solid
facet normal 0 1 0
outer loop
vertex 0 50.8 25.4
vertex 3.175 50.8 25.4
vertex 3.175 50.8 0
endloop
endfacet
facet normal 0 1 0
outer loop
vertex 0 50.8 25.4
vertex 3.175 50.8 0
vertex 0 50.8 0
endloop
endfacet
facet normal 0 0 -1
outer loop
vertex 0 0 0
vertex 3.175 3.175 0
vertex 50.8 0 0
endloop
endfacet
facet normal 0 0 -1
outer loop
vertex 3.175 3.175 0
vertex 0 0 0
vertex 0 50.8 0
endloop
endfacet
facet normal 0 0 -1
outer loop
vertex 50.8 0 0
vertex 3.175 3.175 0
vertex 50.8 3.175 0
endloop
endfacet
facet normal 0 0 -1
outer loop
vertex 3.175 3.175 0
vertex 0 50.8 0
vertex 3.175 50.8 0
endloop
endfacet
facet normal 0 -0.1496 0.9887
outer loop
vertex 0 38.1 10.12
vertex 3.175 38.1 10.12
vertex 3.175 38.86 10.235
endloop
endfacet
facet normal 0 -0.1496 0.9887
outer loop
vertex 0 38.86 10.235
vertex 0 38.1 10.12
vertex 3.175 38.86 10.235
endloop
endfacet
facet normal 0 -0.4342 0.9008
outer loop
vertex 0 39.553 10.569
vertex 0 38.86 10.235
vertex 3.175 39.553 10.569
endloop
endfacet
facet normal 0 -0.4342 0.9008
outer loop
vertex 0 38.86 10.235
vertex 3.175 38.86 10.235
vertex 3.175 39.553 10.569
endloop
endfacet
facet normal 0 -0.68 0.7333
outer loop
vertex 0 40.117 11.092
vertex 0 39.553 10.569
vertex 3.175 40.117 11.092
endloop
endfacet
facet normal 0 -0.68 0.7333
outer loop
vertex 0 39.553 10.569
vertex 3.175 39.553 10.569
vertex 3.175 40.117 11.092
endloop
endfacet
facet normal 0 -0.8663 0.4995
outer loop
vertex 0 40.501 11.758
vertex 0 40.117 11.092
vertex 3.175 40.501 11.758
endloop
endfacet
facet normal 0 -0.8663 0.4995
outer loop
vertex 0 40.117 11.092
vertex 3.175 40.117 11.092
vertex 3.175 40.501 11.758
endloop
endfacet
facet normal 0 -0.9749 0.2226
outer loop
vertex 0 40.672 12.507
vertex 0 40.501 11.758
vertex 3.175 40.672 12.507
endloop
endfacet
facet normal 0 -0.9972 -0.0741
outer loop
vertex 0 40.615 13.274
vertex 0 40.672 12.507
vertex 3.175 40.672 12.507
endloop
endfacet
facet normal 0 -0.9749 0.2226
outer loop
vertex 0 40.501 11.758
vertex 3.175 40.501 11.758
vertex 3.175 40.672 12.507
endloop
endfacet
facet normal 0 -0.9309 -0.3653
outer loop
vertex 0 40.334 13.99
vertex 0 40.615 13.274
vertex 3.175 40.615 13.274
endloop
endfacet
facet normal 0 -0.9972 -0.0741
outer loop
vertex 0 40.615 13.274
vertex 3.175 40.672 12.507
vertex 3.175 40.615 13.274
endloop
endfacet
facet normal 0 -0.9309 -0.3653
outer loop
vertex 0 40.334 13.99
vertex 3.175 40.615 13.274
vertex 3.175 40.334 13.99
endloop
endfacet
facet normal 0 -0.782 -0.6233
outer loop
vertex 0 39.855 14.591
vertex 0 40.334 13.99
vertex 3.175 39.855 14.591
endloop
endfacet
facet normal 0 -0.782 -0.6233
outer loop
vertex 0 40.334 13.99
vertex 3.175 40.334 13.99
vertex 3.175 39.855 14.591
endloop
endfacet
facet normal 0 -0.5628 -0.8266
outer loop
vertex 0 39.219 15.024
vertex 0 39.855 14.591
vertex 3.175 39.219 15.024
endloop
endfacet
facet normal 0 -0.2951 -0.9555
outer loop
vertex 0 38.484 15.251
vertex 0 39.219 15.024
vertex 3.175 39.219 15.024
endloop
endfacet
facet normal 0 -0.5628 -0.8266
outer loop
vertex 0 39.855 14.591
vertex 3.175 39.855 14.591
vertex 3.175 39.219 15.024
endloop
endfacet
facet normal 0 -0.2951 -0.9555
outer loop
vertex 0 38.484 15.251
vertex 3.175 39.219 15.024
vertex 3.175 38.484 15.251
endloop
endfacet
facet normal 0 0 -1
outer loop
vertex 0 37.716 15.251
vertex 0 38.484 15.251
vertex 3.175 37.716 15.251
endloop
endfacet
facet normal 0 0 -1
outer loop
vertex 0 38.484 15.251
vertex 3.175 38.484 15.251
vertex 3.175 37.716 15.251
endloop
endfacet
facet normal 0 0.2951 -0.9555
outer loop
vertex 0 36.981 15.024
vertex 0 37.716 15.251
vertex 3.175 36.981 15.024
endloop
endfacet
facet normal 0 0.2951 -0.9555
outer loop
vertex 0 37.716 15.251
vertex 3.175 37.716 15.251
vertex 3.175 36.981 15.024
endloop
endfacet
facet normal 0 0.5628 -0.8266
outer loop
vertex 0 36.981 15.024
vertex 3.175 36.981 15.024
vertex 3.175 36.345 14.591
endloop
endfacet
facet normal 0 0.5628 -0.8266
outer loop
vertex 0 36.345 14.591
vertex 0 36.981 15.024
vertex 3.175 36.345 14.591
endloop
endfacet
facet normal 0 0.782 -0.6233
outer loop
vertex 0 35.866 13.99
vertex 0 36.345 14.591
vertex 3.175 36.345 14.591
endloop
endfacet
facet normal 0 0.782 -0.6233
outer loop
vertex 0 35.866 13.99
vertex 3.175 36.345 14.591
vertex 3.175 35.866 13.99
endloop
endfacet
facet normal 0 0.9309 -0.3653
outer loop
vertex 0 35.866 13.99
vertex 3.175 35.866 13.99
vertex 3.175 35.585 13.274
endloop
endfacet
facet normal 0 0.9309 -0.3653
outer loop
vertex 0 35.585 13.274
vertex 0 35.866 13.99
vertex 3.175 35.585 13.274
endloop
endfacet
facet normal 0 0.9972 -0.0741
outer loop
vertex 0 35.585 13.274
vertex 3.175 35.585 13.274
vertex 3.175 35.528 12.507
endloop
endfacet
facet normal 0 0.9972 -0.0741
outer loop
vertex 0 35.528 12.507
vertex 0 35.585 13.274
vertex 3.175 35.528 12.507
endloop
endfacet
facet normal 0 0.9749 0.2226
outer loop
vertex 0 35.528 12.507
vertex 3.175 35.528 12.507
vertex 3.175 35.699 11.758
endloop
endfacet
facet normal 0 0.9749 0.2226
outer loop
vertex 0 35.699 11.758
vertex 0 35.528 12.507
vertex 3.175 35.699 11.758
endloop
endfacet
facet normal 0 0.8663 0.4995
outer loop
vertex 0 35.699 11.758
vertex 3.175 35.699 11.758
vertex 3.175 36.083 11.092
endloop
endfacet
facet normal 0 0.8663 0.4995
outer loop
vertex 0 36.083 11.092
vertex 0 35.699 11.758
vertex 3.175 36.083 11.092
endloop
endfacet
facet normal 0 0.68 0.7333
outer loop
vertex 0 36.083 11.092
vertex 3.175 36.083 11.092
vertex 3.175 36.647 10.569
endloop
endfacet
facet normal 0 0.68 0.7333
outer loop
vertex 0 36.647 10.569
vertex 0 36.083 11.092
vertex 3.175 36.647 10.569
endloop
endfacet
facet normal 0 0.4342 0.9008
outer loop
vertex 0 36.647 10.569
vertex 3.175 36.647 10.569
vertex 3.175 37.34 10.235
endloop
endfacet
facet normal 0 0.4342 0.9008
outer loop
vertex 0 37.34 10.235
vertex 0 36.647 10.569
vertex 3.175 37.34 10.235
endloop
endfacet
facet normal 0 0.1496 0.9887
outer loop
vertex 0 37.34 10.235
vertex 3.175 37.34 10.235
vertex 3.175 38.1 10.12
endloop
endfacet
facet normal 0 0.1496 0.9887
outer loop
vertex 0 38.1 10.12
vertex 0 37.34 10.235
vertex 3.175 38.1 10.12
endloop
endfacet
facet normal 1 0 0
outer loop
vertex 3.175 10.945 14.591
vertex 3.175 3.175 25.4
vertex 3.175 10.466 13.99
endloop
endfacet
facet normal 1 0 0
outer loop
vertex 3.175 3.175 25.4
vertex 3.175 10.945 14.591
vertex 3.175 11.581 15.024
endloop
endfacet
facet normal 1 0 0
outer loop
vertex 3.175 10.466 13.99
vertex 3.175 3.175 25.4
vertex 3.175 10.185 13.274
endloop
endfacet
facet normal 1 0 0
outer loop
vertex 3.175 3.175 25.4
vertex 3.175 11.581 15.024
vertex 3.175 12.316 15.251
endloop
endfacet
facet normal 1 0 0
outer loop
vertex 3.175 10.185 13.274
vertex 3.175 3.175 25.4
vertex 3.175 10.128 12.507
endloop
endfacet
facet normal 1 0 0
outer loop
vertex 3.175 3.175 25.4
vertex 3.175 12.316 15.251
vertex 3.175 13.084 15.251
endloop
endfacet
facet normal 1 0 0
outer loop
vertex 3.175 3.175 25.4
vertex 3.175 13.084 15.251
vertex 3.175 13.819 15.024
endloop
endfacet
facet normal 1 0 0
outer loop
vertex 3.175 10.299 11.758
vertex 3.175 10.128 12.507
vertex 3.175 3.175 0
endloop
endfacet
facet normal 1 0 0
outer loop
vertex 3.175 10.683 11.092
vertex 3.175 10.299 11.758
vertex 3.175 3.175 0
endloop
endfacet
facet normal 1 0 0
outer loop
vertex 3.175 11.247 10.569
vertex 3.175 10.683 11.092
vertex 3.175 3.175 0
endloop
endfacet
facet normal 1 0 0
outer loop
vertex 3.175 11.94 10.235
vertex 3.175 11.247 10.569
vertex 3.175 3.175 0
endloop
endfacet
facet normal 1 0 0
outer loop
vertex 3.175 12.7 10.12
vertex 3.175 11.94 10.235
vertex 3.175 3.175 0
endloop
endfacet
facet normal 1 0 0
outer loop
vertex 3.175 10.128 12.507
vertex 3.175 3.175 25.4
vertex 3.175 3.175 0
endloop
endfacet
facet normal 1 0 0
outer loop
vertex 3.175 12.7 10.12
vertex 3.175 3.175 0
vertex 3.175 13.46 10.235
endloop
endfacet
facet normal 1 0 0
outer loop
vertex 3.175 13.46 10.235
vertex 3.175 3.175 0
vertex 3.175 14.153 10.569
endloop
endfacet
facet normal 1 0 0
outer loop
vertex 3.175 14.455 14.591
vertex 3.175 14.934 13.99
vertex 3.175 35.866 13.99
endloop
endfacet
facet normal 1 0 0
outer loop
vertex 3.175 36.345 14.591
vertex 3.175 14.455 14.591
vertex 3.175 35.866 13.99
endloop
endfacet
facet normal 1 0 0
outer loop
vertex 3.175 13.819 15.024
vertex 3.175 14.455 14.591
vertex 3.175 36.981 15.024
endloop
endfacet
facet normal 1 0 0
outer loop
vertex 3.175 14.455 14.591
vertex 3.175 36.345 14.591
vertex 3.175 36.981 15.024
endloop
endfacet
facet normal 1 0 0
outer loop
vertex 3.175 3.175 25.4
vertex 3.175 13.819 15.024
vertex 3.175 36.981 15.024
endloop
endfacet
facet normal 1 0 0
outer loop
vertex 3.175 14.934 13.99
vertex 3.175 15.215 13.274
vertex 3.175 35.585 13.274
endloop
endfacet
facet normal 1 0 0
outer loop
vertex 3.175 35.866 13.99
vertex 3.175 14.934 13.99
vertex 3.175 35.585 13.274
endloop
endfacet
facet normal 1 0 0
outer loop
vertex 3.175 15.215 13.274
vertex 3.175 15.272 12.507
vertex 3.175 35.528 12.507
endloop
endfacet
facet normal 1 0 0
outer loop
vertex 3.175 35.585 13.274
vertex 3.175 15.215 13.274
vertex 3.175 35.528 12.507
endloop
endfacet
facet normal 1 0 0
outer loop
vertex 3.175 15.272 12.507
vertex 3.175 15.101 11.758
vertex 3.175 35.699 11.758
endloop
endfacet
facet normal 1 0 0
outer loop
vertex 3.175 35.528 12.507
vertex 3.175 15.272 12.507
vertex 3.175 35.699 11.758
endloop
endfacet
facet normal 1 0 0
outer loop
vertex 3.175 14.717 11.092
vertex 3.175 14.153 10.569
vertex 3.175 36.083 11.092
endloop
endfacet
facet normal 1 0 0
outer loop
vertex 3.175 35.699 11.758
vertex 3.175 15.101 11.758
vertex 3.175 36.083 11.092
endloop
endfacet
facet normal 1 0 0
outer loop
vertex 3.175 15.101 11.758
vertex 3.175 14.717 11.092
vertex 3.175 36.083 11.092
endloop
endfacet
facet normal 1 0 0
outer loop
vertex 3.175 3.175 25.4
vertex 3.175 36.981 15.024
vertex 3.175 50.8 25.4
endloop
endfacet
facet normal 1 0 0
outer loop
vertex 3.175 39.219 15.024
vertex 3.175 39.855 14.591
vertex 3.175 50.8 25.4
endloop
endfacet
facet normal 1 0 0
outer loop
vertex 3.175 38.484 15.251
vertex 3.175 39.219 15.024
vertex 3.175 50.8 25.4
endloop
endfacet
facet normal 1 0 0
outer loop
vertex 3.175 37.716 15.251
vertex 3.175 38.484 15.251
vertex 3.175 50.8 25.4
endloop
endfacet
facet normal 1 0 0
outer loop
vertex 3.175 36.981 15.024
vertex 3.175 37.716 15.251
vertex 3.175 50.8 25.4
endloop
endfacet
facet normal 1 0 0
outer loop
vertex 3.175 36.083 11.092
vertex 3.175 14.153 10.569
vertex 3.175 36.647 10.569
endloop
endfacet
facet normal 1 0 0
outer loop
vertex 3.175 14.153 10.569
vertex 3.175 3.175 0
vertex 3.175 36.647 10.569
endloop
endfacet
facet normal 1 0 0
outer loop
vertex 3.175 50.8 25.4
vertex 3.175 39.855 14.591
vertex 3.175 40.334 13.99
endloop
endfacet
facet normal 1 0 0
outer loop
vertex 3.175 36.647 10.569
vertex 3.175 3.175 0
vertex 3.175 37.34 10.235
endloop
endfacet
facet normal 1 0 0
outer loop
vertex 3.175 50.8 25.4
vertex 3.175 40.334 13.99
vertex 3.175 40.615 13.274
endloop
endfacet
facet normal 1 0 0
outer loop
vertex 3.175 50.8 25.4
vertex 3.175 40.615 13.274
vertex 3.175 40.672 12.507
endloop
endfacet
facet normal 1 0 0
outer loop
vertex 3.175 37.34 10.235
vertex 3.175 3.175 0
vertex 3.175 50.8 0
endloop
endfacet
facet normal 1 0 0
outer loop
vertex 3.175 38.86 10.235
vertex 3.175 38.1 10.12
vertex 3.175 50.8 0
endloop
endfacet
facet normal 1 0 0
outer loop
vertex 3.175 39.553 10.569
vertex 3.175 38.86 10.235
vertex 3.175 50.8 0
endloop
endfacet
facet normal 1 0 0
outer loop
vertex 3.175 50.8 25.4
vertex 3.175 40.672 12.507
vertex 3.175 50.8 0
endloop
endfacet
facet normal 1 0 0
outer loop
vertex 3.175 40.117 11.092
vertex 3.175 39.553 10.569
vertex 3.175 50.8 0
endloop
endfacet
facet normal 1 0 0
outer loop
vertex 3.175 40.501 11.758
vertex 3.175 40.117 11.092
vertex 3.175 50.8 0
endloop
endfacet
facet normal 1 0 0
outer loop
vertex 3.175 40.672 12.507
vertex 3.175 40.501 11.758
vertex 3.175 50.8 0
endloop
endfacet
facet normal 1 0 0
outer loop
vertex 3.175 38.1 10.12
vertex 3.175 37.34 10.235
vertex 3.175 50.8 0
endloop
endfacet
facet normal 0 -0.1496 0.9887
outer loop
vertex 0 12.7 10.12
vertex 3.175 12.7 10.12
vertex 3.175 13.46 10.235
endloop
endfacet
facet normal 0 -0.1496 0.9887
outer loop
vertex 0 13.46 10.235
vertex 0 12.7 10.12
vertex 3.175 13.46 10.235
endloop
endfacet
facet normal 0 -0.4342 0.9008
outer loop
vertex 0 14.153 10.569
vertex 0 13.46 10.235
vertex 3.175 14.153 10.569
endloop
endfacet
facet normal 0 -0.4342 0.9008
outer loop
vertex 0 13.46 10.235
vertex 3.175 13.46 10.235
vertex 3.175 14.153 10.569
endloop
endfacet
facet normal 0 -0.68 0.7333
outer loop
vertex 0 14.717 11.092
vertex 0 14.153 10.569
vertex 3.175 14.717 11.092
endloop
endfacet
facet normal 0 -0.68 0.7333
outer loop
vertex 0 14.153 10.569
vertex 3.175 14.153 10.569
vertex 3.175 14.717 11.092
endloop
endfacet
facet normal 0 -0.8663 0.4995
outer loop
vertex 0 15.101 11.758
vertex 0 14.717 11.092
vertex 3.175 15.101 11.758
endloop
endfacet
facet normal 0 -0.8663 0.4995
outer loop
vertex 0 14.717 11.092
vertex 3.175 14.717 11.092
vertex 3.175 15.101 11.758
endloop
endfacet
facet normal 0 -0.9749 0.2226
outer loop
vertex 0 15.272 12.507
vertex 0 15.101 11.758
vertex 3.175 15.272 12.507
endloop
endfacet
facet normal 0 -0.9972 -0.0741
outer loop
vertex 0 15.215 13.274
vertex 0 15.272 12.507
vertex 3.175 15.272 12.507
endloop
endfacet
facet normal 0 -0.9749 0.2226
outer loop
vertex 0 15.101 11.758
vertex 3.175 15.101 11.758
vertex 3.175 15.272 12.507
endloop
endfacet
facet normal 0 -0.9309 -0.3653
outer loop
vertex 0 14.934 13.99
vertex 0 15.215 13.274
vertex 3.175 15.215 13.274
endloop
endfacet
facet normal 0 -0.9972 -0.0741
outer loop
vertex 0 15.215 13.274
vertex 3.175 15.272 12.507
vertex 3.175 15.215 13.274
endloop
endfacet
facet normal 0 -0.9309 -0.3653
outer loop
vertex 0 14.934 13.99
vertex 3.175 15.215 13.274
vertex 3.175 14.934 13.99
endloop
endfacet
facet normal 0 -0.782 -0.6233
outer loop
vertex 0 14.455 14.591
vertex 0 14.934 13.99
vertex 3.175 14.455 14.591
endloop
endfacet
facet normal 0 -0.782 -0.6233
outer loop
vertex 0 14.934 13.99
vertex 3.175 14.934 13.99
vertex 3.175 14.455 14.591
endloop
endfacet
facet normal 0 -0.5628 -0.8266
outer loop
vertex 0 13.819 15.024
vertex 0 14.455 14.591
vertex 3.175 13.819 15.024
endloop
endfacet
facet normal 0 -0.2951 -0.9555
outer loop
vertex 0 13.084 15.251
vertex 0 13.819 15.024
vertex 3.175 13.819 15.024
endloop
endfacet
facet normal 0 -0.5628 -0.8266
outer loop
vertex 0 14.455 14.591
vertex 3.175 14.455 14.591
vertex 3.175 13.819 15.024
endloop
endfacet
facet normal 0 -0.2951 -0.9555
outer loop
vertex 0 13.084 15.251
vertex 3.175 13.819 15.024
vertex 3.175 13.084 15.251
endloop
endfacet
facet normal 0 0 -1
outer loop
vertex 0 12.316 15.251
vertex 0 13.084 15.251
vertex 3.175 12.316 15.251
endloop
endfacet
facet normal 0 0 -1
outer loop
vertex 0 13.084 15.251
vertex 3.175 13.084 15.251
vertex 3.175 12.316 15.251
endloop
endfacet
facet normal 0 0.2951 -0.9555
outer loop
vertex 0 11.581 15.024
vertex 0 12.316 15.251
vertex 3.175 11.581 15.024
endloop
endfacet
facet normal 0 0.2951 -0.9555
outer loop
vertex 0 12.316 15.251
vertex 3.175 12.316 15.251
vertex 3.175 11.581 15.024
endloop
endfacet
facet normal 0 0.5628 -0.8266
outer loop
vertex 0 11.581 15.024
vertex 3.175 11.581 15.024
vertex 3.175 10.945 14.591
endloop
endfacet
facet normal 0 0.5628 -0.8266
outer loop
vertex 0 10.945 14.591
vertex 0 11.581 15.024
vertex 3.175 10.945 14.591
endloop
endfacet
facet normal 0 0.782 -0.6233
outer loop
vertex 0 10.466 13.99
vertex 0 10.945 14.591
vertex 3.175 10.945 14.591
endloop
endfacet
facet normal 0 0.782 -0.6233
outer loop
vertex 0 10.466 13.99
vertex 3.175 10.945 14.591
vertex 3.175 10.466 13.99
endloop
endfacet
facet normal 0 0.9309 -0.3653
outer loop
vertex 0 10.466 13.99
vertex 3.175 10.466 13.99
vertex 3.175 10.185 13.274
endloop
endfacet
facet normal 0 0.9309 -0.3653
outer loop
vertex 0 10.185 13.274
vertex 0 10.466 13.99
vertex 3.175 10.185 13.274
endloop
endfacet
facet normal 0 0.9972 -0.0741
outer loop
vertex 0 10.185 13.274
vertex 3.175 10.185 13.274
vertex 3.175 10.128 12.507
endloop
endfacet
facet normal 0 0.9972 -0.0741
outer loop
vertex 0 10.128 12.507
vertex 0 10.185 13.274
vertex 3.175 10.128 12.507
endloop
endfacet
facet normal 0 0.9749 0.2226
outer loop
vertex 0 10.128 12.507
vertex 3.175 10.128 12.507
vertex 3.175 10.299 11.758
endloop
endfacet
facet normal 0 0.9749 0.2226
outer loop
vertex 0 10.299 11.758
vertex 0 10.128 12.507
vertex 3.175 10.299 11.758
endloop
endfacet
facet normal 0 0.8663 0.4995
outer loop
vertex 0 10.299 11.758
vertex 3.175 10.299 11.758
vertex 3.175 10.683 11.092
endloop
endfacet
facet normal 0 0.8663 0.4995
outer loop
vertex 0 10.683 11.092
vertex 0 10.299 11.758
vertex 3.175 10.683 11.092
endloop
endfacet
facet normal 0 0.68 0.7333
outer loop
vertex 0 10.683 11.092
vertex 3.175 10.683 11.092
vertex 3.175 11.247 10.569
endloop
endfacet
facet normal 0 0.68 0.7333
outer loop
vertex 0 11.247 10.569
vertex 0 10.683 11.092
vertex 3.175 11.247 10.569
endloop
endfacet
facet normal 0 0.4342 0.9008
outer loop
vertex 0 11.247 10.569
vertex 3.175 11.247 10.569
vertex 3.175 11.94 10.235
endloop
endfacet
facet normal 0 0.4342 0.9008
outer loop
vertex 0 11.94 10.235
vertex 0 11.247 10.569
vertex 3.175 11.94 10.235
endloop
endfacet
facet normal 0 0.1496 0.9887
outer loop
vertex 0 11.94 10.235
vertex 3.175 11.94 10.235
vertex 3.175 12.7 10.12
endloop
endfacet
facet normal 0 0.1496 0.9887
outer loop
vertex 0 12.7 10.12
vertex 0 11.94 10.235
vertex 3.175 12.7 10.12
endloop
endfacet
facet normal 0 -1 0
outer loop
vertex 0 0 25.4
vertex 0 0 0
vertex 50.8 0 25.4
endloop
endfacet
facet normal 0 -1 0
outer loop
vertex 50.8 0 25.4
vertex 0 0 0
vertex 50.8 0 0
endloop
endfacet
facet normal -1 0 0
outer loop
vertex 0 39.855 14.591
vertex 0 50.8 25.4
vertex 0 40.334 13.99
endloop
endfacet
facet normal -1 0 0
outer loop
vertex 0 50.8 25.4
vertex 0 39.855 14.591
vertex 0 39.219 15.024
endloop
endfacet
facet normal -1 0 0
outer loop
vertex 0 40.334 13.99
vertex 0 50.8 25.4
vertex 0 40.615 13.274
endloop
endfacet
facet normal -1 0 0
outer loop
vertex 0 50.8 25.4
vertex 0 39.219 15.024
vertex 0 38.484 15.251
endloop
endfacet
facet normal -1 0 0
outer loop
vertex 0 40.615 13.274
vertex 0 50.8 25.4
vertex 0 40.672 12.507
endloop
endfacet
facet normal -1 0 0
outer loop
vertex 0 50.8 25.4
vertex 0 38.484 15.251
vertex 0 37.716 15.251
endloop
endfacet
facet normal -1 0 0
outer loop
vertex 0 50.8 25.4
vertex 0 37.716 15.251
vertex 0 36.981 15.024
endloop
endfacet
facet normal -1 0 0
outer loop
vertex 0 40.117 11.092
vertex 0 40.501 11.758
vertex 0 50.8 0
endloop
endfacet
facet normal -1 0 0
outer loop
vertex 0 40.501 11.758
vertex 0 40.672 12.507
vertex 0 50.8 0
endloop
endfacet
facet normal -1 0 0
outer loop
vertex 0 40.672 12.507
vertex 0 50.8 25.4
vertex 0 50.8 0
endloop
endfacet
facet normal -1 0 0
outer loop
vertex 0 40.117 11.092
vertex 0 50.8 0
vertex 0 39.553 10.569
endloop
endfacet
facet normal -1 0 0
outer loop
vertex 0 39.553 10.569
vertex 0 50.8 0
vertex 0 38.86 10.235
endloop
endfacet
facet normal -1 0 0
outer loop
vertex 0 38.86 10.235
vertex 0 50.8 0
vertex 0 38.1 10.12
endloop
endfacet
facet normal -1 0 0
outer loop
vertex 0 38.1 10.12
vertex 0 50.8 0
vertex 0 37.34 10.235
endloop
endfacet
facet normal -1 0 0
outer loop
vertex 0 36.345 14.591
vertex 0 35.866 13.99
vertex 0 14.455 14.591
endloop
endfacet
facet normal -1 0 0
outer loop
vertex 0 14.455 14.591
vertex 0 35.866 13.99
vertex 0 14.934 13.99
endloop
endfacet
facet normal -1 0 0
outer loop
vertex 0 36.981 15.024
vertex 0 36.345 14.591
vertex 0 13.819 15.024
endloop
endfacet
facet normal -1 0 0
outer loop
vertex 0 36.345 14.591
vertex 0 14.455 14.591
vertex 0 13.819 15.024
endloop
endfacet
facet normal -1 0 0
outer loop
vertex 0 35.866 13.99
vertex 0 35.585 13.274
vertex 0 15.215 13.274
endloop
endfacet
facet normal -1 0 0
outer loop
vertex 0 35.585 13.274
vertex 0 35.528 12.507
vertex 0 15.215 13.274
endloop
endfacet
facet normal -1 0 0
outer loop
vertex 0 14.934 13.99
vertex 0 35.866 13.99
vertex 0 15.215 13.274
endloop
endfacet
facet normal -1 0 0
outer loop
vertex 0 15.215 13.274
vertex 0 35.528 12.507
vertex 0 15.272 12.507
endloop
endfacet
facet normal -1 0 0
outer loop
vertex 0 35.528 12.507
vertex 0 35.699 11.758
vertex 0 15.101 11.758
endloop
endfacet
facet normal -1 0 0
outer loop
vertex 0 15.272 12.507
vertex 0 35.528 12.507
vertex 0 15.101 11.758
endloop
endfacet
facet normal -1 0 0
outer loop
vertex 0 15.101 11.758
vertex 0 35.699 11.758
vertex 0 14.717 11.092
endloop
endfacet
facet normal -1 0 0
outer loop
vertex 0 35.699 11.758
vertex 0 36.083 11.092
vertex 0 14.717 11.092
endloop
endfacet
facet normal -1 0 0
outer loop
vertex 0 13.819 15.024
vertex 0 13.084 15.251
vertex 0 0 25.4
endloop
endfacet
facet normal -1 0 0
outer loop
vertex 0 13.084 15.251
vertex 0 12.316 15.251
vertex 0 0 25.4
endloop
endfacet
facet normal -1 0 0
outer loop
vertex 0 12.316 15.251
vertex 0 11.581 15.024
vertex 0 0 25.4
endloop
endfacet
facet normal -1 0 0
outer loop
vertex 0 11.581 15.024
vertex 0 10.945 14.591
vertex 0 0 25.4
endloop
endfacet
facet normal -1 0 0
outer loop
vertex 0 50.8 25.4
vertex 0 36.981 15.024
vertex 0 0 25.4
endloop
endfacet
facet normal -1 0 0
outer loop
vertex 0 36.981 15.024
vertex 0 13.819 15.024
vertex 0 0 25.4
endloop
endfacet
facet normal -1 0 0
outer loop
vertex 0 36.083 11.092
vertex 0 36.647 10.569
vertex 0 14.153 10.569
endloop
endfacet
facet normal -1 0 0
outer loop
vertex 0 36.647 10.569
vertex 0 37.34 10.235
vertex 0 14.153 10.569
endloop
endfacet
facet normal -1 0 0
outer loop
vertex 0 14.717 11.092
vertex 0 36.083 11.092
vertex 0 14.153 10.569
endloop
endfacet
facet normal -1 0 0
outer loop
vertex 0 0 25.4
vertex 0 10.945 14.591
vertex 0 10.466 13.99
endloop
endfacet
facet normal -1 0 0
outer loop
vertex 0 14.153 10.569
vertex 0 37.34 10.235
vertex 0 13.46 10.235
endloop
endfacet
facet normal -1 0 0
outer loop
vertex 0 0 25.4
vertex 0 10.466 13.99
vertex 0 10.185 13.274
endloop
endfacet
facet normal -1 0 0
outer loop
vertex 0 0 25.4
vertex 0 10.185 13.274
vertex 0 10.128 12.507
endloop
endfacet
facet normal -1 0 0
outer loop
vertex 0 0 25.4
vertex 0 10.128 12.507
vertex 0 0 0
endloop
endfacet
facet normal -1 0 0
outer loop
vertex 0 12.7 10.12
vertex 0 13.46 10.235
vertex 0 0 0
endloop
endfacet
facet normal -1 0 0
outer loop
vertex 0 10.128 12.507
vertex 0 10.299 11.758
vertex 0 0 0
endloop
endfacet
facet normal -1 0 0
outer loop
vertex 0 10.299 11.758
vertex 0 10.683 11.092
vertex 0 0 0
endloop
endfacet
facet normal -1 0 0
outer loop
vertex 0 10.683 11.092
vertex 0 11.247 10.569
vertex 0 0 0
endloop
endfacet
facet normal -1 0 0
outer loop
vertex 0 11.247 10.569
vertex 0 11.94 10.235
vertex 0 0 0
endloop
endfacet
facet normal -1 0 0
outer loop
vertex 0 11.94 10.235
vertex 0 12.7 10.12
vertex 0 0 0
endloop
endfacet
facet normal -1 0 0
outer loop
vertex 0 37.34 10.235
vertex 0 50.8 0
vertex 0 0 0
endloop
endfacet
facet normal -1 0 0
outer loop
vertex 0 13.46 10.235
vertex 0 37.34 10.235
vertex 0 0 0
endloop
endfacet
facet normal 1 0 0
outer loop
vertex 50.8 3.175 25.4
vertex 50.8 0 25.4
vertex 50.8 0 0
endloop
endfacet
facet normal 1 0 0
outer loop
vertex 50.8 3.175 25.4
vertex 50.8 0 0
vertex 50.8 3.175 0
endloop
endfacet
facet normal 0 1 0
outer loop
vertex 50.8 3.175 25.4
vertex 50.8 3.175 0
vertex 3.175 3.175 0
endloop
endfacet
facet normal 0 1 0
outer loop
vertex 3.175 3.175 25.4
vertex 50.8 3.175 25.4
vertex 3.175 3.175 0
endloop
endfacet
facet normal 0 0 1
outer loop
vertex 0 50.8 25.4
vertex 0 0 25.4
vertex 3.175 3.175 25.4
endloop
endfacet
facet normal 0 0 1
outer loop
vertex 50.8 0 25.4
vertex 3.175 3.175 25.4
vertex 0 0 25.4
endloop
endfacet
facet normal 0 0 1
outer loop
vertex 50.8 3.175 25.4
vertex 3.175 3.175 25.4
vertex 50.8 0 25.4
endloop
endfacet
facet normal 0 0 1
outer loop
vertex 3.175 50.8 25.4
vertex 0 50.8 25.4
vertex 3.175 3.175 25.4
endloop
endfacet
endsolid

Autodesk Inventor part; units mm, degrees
ref_plane "YZ Plane" through (0, 0, 0) normal (1, 0, 0) x (0, 1, 0)
ref_plane "XZ Plane" through (0, 0, 0) normal (0, 1, 0) x (-1, 0, 0)
ref_plane "XY Plane" through (0, 0, 0) normal (0, 0, 1) x (1, 0, 0)
sketch "Sketch1" plane through (0, 0, 0) normal (0, 0, 1) x (1, 0, 0)
  line L0 (0, 0) -> (3.175, 0)
  line L1 (3.175, 0) -> (3.175, 50.8)
  line L2 (3.175, 50.8) -> (0, 50.8)
  line L3 (0, 50.8) -> (0, 0)
  line L4 (0, 0) -> (50.8, 0)
  line L5 (50.8, 0) -> (50.8, 3.175)
  line L6 (50.8, 3.175) -> (0, 3.175)
  line L7 (0, 3.175) -> (0, 0)
  dimension "d0" = 3.175
  dimension "d1" = 50.8
  dimension "d2" = 50.8
  dimension "d3" = 3.175
extrude "Extrusion1" add sketch "Sketch1" along normal blind 25.4
sketch "Sketch2" plane through (3.175, 3.175, 0) normal (1, 0, 0) x (0, 0, -1)
  line L0 (0, 47.625) -> (-25.4, 47.625) construction
  line L1 (-12.7, 47.625) -> (-12.7, 34.925) construction
  line L2 (-12.7, 34.925) -> (-12.7, 9.525) construction
  circle A0 centre (-12.7, 34.925) radius 2.5797
  circle A1 centre (-12.7, 9.525) radius 2.5797
  point P0 (0, -3.175)
  dimension "d6" = 12.7
  dimension "d7" = 25.4
  dimension "d8" = 5.1594
extrude "Extrusion2" cut sketch "Sketch2" against normal blind 25.4
properties part number "2x2 L"
